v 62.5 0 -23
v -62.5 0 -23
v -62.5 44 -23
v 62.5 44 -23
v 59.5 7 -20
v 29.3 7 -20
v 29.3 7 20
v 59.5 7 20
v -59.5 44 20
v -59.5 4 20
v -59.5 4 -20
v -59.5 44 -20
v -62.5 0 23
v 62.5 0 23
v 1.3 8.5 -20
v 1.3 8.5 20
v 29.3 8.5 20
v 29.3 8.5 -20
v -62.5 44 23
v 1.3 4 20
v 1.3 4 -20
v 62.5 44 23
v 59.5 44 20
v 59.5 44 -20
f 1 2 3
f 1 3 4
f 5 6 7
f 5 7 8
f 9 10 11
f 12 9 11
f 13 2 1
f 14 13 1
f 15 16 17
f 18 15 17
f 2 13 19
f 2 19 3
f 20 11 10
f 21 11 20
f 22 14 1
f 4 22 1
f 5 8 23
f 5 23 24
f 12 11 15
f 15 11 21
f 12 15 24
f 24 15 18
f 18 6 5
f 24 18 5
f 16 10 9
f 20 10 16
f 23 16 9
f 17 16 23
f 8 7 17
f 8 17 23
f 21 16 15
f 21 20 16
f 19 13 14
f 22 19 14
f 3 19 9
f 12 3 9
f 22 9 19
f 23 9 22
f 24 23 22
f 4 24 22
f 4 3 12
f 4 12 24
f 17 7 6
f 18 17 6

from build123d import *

# Parameters (mm, degrees)
SKETCH1_W           = 119
SKETCH1_H           = 40
BOSS_EXTRUDE1_DEPTH = 4
SKETCH2_W           = 125
SKETCH2_H           = 46
SKETCH2_W_2         = 119
SKETCH2_H_2         = 40
BOSS_EXTRUDE2_DEPTH = 44
SKETCH3_W           = 58.2
SKETCH3_H           = 40
BOSS_EXTRUDE3_DEPTH = 3
SKETCH4_W           = 28
SKETCH4_H           = 40
BOSS_EXTRUDE4_DEPTH = 1.5


with BuildPart() as part:
    # Sketch1 → Boss-Extrude1 (new body)
    with BuildSketch(Plane(origin=(0, 0, 0), x_dir=(1, 0, 0), z_dir=(0, 1, 0))):
        Rectangle(SKETCH1_W, SKETCH1_H)
    extrude(amount=BOSS_EXTRUDE1_DEPTH)

    # Sketch2 → Boss-Extrude2 (add)
    with BuildSketch(Plane(origin=(0, 0, 0), x_dir=(1, 0, 0), z_dir=(0, 1, 0))):
        Rectangle(SKETCH2_W, SKETCH2_H)
        Rectangle(SKETCH2_W_2, SKETCH2_H_2, mode=Mode.SUBTRACT)
    extrude(amount=BOSS_EXTRUDE2_DEPTH)

    # Sketch3 → Boss-Extrude3 (add)
    with BuildSketch(Plane(origin=(0, 4, 0), x_dir=(1, 0, 0), z_dir=(0, 1, 0))):
        with Locations((30.4, 0)):
            Rectangle(SKETCH3_W, SKETCH3_H)
    extrude(amount=BOSS_EXTRUDE3_DEPTH)

    # Sketch4 → Boss-Extrude4 (add)
    with BuildSketch(Plane(origin=(0, 7, 0), x_dir=(1, 0, 0), z_dir=(0, 1, 0))):
        with Locations((15.3, 0)):
            Rectangle(SKETCH4_W, SKETCH4_H)
    extrude(amount=BOSS_EXTRUDE4_DEPTH)


solid = part.part
